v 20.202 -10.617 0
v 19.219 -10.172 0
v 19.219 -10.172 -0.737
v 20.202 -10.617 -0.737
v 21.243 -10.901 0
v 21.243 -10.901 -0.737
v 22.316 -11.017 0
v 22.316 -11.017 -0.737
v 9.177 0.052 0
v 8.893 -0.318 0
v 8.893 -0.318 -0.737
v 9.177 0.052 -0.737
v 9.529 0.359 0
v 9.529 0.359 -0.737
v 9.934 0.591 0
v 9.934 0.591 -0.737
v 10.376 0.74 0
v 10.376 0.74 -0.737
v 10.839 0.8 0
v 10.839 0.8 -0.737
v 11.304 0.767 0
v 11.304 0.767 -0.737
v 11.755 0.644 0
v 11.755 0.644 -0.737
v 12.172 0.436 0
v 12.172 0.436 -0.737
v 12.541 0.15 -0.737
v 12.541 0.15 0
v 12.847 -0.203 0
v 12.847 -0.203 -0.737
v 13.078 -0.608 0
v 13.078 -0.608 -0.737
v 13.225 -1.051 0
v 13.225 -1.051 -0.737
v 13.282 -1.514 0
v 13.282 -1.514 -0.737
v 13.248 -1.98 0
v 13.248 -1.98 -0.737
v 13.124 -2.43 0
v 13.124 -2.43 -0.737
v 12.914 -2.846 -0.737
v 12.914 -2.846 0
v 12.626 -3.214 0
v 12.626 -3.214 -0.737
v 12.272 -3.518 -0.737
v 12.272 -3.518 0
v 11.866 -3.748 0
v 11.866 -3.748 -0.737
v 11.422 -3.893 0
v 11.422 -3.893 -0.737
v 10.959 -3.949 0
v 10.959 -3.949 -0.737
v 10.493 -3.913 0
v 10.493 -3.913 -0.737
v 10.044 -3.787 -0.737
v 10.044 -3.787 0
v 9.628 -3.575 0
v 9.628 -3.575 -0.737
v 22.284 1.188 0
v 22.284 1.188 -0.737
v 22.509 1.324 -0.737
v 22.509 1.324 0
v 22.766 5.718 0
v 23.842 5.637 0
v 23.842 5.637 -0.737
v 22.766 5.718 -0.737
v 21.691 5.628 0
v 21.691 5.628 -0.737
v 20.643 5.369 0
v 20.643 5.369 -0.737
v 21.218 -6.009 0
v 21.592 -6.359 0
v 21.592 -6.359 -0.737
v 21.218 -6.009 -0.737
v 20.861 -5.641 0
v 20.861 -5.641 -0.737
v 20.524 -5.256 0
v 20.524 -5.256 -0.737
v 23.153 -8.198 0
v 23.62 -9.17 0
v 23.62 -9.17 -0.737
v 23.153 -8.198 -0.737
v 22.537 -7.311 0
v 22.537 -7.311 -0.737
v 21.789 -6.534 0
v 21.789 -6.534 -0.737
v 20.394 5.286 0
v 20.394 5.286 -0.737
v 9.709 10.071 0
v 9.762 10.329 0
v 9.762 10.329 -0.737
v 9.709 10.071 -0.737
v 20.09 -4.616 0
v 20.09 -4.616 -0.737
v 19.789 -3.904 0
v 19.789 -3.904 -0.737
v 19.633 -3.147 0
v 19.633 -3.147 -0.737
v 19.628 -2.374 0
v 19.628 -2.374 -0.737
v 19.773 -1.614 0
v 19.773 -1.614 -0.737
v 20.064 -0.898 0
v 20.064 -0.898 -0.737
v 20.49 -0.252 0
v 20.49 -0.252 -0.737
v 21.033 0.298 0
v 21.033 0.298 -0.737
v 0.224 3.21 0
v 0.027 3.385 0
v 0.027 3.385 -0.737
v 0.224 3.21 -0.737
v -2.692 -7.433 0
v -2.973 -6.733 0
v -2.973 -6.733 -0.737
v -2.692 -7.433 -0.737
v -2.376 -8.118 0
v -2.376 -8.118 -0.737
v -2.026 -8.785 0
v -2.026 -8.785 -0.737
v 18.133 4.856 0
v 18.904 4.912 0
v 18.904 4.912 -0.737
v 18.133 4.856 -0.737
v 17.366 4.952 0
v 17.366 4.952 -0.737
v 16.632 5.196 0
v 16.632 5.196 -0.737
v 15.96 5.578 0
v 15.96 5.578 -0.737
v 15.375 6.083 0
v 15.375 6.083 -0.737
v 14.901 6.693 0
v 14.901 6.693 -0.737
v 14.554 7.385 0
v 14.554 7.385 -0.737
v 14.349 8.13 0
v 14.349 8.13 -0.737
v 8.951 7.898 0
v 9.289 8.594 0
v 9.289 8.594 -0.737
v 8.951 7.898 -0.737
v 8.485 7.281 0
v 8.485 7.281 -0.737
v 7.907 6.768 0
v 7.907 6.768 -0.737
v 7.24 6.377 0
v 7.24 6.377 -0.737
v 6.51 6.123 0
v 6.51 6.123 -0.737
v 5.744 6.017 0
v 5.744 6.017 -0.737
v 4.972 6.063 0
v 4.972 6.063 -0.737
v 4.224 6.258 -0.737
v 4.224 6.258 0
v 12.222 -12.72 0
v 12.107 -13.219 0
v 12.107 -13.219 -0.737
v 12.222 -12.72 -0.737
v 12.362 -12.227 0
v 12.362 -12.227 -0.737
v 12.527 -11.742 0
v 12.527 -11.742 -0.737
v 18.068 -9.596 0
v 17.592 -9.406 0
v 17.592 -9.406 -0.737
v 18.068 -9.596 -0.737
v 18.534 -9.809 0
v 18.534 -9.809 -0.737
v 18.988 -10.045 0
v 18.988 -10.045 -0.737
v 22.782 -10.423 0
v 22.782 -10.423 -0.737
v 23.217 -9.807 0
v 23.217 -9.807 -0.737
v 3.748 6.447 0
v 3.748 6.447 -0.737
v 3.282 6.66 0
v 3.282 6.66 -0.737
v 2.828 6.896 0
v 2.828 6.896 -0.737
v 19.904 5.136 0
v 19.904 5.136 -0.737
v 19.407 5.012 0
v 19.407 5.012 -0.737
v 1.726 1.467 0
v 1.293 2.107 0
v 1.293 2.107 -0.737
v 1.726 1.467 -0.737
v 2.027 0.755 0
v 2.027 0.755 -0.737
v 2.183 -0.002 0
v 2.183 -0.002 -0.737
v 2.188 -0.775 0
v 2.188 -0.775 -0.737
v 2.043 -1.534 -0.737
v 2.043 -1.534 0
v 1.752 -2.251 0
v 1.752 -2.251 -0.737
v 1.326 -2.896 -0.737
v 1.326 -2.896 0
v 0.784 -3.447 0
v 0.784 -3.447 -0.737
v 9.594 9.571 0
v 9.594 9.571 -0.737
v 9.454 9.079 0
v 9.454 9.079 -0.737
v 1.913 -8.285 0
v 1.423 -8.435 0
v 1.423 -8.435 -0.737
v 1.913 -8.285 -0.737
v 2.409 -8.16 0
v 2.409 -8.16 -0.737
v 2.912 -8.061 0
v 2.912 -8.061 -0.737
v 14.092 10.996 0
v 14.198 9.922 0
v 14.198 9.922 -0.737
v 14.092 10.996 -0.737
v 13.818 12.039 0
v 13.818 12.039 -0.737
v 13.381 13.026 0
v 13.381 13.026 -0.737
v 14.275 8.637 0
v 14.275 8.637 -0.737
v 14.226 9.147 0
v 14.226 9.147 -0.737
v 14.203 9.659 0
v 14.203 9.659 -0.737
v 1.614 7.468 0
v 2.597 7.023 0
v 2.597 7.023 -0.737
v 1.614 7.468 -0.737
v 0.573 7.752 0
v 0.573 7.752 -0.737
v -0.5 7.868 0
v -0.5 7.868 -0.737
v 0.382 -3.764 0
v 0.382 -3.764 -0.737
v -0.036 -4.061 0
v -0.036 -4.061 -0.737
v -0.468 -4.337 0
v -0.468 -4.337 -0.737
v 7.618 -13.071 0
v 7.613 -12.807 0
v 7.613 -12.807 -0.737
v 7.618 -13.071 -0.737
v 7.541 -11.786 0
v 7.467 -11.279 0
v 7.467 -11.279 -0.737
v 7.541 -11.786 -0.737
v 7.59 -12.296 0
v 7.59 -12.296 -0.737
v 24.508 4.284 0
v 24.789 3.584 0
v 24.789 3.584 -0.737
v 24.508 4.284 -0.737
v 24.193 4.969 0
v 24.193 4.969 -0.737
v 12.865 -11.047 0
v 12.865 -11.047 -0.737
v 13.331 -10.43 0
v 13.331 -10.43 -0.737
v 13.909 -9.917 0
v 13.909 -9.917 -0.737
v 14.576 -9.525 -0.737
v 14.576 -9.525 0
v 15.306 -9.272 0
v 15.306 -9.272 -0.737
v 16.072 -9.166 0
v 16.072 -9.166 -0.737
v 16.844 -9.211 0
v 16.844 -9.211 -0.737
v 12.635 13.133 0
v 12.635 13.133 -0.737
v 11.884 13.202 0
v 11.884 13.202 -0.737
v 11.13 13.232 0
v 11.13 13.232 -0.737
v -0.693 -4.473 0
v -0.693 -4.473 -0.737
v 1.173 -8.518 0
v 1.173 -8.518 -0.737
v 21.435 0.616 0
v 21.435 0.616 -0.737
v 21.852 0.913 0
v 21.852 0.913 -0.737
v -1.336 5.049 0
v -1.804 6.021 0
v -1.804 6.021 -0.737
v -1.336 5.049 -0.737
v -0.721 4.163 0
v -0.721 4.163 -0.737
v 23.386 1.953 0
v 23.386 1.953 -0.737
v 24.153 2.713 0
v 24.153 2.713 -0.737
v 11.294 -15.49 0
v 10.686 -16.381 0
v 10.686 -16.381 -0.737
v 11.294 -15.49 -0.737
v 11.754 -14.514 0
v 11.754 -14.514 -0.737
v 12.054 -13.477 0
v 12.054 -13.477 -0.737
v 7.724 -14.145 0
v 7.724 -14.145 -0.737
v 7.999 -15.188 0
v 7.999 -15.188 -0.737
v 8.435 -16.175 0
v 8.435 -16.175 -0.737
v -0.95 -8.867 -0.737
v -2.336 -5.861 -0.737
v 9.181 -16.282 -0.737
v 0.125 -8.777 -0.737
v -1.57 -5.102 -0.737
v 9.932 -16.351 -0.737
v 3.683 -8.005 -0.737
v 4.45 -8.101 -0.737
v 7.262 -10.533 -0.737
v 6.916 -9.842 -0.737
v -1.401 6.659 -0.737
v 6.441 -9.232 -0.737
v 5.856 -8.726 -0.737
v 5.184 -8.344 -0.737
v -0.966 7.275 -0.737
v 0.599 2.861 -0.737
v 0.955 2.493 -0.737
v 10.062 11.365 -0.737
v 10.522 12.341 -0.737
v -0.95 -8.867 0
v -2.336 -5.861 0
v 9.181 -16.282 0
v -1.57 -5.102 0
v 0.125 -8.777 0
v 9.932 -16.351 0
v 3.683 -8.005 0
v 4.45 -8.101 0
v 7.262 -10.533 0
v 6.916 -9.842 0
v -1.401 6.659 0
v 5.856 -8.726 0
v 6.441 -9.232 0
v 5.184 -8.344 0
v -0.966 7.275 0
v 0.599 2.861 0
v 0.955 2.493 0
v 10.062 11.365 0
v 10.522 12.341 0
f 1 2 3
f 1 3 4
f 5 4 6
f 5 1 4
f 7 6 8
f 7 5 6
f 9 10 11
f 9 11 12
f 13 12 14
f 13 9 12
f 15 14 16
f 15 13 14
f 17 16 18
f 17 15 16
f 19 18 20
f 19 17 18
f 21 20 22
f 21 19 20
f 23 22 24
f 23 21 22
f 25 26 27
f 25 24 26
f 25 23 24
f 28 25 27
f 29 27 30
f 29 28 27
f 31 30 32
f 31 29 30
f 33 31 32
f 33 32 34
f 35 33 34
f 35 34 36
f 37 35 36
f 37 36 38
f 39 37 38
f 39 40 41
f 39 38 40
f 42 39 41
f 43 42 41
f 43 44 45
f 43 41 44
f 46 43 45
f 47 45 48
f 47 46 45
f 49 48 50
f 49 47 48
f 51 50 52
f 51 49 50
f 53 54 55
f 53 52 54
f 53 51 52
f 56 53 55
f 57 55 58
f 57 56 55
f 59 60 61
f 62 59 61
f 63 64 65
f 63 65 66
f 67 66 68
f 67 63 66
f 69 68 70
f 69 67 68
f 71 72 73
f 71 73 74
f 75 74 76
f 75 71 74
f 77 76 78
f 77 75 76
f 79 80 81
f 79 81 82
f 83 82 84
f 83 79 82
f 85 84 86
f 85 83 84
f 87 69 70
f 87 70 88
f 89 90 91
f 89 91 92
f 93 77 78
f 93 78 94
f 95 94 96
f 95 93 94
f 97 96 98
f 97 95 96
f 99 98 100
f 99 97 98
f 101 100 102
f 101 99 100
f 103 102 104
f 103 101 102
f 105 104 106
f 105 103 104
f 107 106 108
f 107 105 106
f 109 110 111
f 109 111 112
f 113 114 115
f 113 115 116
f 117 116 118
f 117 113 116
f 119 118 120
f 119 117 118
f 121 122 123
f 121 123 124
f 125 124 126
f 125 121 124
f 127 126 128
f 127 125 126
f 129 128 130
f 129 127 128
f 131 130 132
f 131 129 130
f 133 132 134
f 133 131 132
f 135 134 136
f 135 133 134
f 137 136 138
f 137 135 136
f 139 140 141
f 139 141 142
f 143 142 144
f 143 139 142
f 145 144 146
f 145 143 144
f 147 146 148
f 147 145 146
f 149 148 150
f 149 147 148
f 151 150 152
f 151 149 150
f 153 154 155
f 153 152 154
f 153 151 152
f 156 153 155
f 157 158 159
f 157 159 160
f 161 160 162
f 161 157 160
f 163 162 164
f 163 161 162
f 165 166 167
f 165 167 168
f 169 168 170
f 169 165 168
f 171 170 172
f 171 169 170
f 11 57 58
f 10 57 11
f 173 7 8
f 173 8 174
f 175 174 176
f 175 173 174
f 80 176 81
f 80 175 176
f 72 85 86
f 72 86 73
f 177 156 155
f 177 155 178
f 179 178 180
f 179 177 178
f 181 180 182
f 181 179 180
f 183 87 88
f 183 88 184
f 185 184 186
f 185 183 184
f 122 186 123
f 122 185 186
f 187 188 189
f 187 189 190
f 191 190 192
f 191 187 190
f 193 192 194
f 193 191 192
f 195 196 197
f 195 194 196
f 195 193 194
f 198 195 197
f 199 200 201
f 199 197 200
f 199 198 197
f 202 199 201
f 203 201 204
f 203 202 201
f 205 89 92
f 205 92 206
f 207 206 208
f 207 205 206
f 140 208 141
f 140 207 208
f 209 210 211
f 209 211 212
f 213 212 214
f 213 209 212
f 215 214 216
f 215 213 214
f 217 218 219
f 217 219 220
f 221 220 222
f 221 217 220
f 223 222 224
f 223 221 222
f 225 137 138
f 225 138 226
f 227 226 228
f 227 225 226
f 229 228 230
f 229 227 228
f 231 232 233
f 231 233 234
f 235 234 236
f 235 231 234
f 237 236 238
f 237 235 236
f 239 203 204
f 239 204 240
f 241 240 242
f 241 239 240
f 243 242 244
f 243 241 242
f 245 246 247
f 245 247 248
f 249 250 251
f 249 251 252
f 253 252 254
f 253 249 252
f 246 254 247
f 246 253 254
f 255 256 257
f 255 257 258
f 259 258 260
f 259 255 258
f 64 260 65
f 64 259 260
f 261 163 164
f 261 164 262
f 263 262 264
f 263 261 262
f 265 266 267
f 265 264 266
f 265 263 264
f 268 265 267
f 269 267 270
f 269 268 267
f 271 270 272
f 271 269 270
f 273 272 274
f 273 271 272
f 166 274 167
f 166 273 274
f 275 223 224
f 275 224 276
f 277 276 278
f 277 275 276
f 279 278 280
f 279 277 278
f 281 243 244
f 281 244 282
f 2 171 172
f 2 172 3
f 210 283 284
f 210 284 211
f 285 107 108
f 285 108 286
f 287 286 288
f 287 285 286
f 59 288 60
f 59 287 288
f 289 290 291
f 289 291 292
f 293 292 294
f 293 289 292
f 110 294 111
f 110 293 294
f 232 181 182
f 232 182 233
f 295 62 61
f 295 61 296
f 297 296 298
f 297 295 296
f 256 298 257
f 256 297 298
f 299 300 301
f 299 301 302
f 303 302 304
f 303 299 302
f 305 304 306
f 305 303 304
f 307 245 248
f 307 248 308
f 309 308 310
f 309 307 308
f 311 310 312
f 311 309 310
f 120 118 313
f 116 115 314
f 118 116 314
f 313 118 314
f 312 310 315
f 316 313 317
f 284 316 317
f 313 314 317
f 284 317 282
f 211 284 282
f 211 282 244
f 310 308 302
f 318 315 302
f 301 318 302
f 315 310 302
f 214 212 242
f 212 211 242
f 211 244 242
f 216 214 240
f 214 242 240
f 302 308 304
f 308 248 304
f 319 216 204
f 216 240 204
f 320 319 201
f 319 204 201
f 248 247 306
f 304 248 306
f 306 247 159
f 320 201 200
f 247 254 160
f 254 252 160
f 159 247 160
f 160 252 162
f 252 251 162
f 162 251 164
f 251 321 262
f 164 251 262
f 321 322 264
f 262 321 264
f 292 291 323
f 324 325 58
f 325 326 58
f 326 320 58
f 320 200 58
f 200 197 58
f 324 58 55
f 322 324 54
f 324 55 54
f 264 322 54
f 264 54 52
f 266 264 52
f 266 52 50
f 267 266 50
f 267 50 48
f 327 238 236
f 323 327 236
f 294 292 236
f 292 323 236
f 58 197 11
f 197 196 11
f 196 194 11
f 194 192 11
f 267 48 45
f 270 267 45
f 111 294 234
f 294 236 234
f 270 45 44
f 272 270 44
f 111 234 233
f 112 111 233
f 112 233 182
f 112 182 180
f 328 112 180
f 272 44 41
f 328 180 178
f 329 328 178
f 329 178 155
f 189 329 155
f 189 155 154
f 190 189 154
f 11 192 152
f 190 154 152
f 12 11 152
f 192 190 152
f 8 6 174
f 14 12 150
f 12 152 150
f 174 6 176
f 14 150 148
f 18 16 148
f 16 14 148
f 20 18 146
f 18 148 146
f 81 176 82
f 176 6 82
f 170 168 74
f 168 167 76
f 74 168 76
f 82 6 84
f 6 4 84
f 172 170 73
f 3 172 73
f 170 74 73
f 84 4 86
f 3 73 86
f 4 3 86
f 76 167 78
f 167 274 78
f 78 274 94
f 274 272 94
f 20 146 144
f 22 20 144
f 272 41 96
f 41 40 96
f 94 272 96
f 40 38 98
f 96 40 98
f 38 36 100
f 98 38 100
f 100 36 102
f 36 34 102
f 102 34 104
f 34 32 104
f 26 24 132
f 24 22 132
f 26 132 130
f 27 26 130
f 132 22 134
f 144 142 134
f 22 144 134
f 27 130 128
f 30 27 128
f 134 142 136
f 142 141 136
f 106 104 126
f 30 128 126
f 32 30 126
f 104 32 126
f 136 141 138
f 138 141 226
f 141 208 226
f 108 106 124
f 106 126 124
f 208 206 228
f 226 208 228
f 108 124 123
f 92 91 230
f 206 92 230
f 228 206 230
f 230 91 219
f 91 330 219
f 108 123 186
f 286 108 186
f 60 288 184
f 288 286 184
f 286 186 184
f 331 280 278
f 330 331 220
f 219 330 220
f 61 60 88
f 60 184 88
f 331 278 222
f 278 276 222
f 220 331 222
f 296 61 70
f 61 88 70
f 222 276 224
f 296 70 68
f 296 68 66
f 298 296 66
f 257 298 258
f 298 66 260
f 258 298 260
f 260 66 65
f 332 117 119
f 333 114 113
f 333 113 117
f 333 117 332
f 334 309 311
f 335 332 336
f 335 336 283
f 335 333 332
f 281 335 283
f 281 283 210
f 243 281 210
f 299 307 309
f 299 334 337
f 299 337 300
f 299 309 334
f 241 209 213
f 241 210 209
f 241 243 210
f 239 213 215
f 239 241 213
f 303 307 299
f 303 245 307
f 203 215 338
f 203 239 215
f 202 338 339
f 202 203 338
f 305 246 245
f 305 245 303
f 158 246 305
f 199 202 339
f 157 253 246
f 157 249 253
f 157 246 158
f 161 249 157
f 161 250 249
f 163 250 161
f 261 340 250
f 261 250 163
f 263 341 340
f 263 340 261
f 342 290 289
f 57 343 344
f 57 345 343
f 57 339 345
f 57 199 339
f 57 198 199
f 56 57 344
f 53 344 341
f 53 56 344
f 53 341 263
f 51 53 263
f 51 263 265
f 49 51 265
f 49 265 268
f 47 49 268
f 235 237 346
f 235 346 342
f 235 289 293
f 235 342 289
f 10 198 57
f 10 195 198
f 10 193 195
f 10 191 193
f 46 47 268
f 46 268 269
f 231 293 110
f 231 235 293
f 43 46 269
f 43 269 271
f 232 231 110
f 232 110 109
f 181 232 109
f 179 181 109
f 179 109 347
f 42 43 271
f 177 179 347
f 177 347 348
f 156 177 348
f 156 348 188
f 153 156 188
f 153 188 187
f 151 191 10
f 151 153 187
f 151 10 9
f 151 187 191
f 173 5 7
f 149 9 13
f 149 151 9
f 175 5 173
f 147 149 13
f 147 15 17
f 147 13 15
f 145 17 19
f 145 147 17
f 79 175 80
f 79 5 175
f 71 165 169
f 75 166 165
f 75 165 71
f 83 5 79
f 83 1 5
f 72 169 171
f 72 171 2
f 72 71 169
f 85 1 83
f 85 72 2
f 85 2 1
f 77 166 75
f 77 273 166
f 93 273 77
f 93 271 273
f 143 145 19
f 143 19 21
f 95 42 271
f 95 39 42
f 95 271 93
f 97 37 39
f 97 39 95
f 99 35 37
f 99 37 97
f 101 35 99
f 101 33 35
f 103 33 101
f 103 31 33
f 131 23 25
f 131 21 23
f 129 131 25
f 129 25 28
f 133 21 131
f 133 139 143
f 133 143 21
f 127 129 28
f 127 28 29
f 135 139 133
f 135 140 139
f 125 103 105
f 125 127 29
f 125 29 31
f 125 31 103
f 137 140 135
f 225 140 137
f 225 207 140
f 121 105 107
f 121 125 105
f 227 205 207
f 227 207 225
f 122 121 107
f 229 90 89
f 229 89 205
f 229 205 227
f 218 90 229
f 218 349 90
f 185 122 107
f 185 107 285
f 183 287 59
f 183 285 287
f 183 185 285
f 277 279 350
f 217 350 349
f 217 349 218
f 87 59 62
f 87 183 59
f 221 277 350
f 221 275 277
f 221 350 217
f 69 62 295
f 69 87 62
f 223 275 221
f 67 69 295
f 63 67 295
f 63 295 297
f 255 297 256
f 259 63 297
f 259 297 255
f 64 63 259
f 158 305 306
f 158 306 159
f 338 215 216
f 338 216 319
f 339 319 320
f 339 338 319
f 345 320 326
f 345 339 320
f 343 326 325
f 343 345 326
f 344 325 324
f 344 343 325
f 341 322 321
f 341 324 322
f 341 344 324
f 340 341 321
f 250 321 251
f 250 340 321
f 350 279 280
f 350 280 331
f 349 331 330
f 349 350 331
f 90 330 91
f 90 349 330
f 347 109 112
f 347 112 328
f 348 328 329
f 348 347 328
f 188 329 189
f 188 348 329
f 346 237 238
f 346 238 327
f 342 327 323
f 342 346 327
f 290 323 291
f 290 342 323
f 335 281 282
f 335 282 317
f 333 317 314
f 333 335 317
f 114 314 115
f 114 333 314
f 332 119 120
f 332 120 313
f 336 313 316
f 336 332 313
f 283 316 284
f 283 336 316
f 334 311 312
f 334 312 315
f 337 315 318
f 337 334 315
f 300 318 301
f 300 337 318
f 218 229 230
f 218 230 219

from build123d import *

# Parameters (mm, degrees)
SKETCH1_R               = 34.867744869
BASE_FLANGE1_DEPTH      = 0.7366
CUT_EXTRUDE1_DEPTH      = 166.090690723
CUT_EXTRUDE1_DEPTH_BACK = 166.090690723
SKETCH2_R               = 180.553154812
CUT_EXTRUDE2_DEPTH      = 143.907778027
CUT_EXTRUDE2_DEPTH_BACK = 143.907778027


# Sheet-metal steps are written as plain solids
with BuildPart() as part:
    # Sketch1 → Base-Flange1 (new body)
    with BuildSketch(Plane.XY):
        Circle(SKETCH1_R)
    extrude(amount=-BASE_FLANGE1_DEPTH)

    # Sketch2 → Cut-Extrude1 (cut, two sides: drawn at the far end of the back side and taken through both)
    with BuildSketch(Plane(origin=(-59.555266985, -54.618905297, 100.906749206), x_dir=(-1, 0, 0), z_dir=(0, 0, -1)).offset(-CUT_EXTRUDE1_DEPTH_BACK)):
        with Locations((-70.46331512, 53.044531114)):
            Circle(SKETCH2_R)
        with BuildLine():
            Line((-81.344420416, 48.08529911), (-81.147360116, 48.260073924))
            ThreePointArc((-81.147360116, 48.260073924), (-80.592208079, 48.791271643), (-80.078779721, 49.362897501))
            ThreePointArc((-80.078779721, 49.362897501), (-79.183035074, 52.245324657), (-80.587831747, 54.91689556))
            ThreePointArc((-80.587831747, 54.91689556), (-81.196617582, 55.385664809), (-81.839082773, 55.807094848))
            Line((-81.839082773, 55.807094848), (-82.06463088, 55.943135463))
            ThreePointArc((-82.06463088, 55.943135463), (-83.339743584, 56.936582022), (-84.344361609, 58.202911795))
            ThreePointArc((-84.344361609, 58.202911795), (-83.910146998, 59.247357512), (-83.397480034, 60.255614309))
            ThreePointArc((-83.397480034, 60.255614309), (-81.782081355, 60.31336879), (-80.198688666, 59.98822872))
            Line((-80.198688666, 59.98822872), (-79.948799088, 59.904956901))
            ThreePointArc((-79.948799088, 59.904956901), (-79.21119235, 59.689779993), (-78.459435657, 59.530950921))
            ThreePointArc((-78.459435657, 59.530950921), (-75.515308192, 60.196426879), (-73.904058259, 62.748801937))
            ThreePointArc((-73.904058259, 62.748801937), (-73.802485098, 63.51041056), (-73.758748573, 64.277516756))
            Line((-73.758748573, 64.277516756), (-73.753707998, 64.540867454))
            ThreePointArc((-73.753707998, 64.540867454), (-73.530914393, 66.141870727), (-72.936549652, 67.645060345))
            ThreePointArc((-72.936549652, 67.645060345), (-71.814925823, 67.79124232), (-70.685416342, 67.851388104))
            ThreePointArc((-70.685416342, 67.851388104), (-69.827700155, 66.481289051), (-69.317583371, 64.947460723))
            Line((-69.317583371, 64.947460723), (-69.264754091, 64.689414091))
            ThreePointArc((-69.264754091, 64.689414091), (-69.082299391, 63.943039464), (-68.843971056, 63.212584534))
            ThreePointArc((-68.843971056, 63.212584534), (-66.795588238, 60.995633336), (-63.779541631, 60.876437491))
            ThreePointArc((-63.779541631, 60.876437491), (-63.069182636, 61.169276865), (-62.38298092, 61.514953022))
            Line((-62.38298092, 61.514953022), (-62.152392238, 61.642263104))
            ThreePointArc((-62.152392238, 61.642263104), (-60.654485929, 62.249819819), (-59.055503163, 62.486679664))
            ThreePointArc((-59.055503163, 62.486679664), (-58.368093945, 61.588415921), (-57.751251427, 60.640304909))
            ThreePointArc((-57.751251427, 60.640304909), (-58.508933919, 59.212451375), (-59.582209824, 58.003763118))
            Line((-59.582209824, 58.003763118), (-59.779270124, 57.828988304))
            ThreePointArc((-59.779270124, 57.828988304), (-60.334422161, 57.297790585), (-60.847850519, 56.726164727))
            ThreePointArc((-60.847850519, 56.726164727), (-61.743595166, 53.843737571), (-60.338798493, 51.172166668))
            ThreePointArc((-60.338798493, 51.172166668), (-59.730012659, 50.703397419), (-59.087547467, 50.28196738))
            Line((-59.087547467, 50.28196738), (-58.861999361, 50.145926765))
            ThreePointArc((-58.861999361, 50.145926765), (-57.586886657, 49.152480206), (-56.582268631, 47.886150433))
            ThreePointArc((-56.582268631, 47.886150433), (-57.016483242, 46.841704716), (-57.529150206, 45.833447919))
            ThreePointArc((-57.529150206, 45.833447919), (-59.144548885, 45.775693438), (-60.727941574, 46.100833508))
            Line((-60.727941574, 46.100833508), (-60.977831152, 46.184105327))
            ThreePointArc((-60.977831152, 46.184105327), (-61.71543789, 46.399282235), (-62.467194583, 46.558111307))
            ThreePointArc((-62.467194583, 46.558111307), (-65.411322049, 45.892635349), (-67.022571982, 43.340260291))
            ThreePointArc((-67.022571982, 43.340260291), (-67.124145142, 42.578651669), (-67.167881667, 41.811545472))
            Line((-67.167881667, 41.811545472), (-67.172922242, 41.548194774))
            ThreePointArc((-67.172922242, 41.548194774), (-67.395715847, 39.947191501), (-67.990080588, 38.444001883))
            ThreePointArc((-67.990080588, 38.444001883), (-69.111704417, 38.297819908), (-70.241213899, 38.237674124))
            ThreePointArc((-70.241213899, 38.237674124), (-71.098930085, 39.607773177), (-71.60904687, 41.141601505))
            Line((-71.60904687, 41.141601505), (-71.661876149, 41.399648137))
            ThreePointArc((-71.661876149, 41.399648137), (-71.844330849, 42.146022764), (-72.082659185, 42.876477694))
            ThreePointArc((-72.082659185, 42.876477694), (-74.131042002, 45.093428892), (-77.147088609, 45.212624737))
            ThreePointArc((-77.147088609, 45.212624737), (-77.857447604, 44.919785363), (-78.54364932, 44.574109206))
            Line((-78.54364932, 44.574109206), (-78.774238002, 44.446799124))
            ThreePointArc((-78.774238002, 44.446799124), (-80.272144311, 43.839242409), (-81.871127077, 43.602382564))
            ThreePointArc((-81.871127077, 43.602382564), (-82.558536295, 44.500646307), (-83.175378813, 45.448757319))
            ThreePointArc((-83.175378813, 45.448757319), (-82.417696321, 46.876610853), (-81.344420416, 48.08529911))
        make_face(mode=Mode.SUBTRACT)
    extrude(amount=CUT_EXTRUDE1_DEPTH + CUT_EXTRUDE1_DEPTH_BACK, mode=Mode.SUBTRACT)

    # Sketch3 → Cut-Extrude2 (cut, two sides: drawn at the far end of the back side and taken through both)
    with BuildSketch(Plane(origin=(-59.555266985, -54.618905297, 92.56319002), x_dir=(-1, 0, 0), z_dir=(0, 0, -1)).offset(-CUT_EXTRUDE2_DEPTH_BACK)):
        with BuildLine():
            Line((-69.183385772, 51.044048454), (-68.447999148, 54.300975121))
            ThreePointArc((-68.447999148, 54.300975121), (-72.779897357, 53.567595882), (-69.183385772, 51.044048454))
        make_face()
    extrude(amount=CUT_EXTRUDE2_DEPTH + CUT_EXTRUDE2_DEPTH_BACK, mode=Mode.SUBTRACT)


solid = part.part
